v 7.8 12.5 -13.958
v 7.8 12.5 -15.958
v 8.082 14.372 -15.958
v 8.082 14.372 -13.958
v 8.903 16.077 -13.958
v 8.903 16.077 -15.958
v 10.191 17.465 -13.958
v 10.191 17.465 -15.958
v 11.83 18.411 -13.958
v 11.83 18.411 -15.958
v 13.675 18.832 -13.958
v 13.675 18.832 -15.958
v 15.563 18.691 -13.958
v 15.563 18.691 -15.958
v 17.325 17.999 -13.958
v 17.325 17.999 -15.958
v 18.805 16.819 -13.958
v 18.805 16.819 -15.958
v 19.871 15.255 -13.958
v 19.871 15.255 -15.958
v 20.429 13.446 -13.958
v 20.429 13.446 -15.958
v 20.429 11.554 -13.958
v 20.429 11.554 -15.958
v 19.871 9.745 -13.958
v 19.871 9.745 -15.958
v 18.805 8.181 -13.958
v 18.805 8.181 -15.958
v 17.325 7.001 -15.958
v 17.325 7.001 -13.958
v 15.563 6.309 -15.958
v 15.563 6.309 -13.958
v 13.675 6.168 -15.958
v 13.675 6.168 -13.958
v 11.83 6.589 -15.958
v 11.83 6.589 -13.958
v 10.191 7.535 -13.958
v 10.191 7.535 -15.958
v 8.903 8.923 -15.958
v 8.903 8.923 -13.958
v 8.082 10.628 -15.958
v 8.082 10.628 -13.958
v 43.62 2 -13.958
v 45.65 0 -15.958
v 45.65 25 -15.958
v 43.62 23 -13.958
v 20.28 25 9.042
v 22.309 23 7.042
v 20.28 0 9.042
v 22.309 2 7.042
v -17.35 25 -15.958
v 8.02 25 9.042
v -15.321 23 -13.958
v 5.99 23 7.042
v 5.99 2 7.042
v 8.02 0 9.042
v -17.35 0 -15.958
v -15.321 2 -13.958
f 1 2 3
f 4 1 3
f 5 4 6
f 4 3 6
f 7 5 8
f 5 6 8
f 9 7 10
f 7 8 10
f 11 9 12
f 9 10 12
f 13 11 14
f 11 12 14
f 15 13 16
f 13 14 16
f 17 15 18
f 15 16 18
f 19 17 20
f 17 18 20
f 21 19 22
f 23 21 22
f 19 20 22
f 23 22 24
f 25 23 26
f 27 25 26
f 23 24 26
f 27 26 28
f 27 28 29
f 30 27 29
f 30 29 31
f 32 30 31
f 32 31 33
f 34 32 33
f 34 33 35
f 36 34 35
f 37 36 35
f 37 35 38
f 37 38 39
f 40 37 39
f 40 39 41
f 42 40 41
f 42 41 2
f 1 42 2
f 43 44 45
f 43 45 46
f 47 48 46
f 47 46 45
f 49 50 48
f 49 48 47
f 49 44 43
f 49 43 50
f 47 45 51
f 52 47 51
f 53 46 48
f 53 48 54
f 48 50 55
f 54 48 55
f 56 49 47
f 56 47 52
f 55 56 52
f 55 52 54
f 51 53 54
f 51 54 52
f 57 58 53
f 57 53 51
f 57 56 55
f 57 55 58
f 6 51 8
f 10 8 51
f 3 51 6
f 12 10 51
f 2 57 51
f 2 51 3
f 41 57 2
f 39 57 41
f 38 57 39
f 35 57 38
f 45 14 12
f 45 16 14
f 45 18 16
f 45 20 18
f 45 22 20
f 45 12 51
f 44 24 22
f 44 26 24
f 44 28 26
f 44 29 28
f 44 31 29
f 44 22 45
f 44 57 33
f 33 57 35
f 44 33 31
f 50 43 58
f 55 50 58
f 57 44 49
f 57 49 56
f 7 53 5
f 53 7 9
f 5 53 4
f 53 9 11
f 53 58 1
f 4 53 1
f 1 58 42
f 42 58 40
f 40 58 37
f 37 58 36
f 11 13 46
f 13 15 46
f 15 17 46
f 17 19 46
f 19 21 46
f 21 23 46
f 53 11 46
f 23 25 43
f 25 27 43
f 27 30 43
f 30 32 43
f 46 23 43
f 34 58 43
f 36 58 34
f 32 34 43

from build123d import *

# Parameters (mm, degrees)
BOSS_EXTRUDE1_DEPTH = 25
SHELL1_T            = -2
SKETCH2_R           = 6.35
CUT_EXTRUDE1_DEPTH  = 10


with BuildPart() as part:
    # Sketch1 → Boss-Extrude1 (new body)
    with BuildSketch(Plane(origin=(0, 0, 0), x_dir=(1, 0, 0), z_dir=(0, 1, 0))):
        Polygon((-17.350316623, 15.957783641), (45.649683377, 15.957783641), (20.279683377, -9.042216359), (8.019683377, -9.042216359), align=None)
    extrude(amount=BOSS_EXTRUDE1_DEPTH)

    # Shell1
    shell1_openings = [part.faces().sort_by_distance(p)[0] for p in [
        (32.964683377, 12.5, -3.457783641),
        (-4.665316623, 12.5, -3.457783641),
    ]]
    offset(amount=SHELL1_T, openings=shell1_openings, kind=Kind.INTERSECTION)

    # Sketch2 → Cut-Extrude1 (cut)
    with BuildSketch(Plane(origin=(0, 0, -15.957783641), x_dir=(-1, 0, 0), z_dir=(0, 0, -1))):
        with Locations((-14.149683377, 12.5)):
            Circle(SKETCH2_R)
    extrude(amount=-CUT_EXTRUDE1_DEPTH, mode=Mode.SUBTRACT)


solid = part.part
